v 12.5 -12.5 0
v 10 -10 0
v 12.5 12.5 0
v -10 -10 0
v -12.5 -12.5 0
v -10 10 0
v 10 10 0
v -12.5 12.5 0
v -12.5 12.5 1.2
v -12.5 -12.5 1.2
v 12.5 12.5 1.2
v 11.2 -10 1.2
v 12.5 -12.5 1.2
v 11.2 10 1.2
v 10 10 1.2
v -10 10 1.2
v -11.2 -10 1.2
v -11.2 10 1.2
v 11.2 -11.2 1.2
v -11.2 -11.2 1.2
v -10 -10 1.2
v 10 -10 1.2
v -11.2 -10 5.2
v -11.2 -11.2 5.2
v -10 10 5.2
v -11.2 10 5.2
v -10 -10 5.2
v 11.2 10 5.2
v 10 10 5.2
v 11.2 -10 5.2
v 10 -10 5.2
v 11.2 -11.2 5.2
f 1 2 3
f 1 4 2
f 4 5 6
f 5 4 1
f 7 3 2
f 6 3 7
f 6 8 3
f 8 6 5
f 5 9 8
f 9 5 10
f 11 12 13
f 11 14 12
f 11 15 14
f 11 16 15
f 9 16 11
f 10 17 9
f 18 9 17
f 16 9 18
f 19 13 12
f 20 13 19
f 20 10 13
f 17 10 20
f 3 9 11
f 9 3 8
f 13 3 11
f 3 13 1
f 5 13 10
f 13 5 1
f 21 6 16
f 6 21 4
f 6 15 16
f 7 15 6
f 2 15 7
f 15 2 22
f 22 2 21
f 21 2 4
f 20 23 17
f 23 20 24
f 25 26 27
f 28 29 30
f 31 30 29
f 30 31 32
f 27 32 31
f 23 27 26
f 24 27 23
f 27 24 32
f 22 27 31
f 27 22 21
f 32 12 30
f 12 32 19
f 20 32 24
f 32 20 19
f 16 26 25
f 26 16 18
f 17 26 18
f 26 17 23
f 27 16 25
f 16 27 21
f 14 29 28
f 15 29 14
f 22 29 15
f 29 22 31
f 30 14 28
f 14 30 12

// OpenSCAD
// ============================================================
// Peltier 쪽 면 - 평면도(XY, 정면에서 본 모습)
// 아래쪽 변("erm_link" 부분)이 ERM 면과 연결됨.
// ============================================================

face_size  = 25;   // 면의 가로/세로 (정사각형)
housing_t  = 1.2;  // 하우징 두께 (사방 테두리)
border_gap = 0.1;  // 테두리 안쪽 빈 공간 (X방향: 좌우 브라켓/연결부 폭 계산용)
top_gap    = 1.3;  // 위쪽 테두리 - 브라켓 사이 Y방향 빈 공간 (bracket_h 1.2mm 축소분 보충: 0.1 -> 1.3)

bracket_w  = 1.2;   // 세로 브라켓(Peltier 고정) 가로 두께
bracket_h  = 20;    // 세로 브라켓(Peltier 고정) 세로 높이
open_w     = 20;    // 브라켓 사이 뚫린 공간 가로 폭
erm_link_h = 1.2;   // ERM 면과 연결되는 부분의 세로 두께 (브라켓과 바로 붙음)
mid_gap    = 0.1;   // ERM 연결부 - 바깥 하우징 테두리 사이 빈 공간

bracket_z  = 4;     // Peltier 고정 두께의 Z방향 깊이
guide_h    = 0.01;  // 참고용 2D 레이아웃 표시용 얇은 두께

// --- 경계 계산 (중심 원점) ---
frame_inner_w = face_size - 2 * housing_t;              // 테두리 프레임 안쪽 폭 (22.6mm)
inner_w       = face_size - 2 * (housing_t + border_gap); // 테두리+갭 안쪽 폭 (22.4mm)

// Y축 (위 -> 아래)
y_top       = face_size / 2;
y1 = y_top - housing_t;      // top_gap 상단
y2 = y1 - top_gap;           // 브라켓 상단
y3 = y2 - bracket_h;         // ERM 연결부 상단 (브라켓과 바로 붙음)
y4 = y3 - erm_link_h;        // mid_gap 상단
y5 = y4 - mid_gap;           // 하우징 아래쪽 테두리 상단
y_bottom = y5 - housing_t;   // 검증용 (-face_size/2 와 같아야 함)

// X축 (왼쪽 -> 오른쪽)
x_left        = -face_size / 2;
x1 = x_left + housing_t;         // border_gap 오른쪽 끝
x2 = x1 + border_gap;            // 왼쪽 브라켓 오른쪽 끝
x3 = x2 + bracket_w;             // 뚫린 공간(open_w) 오른쪽 끝
x4 = x3 + open_w;                // 오른쪽 브라켓 왼쪽 끝
x5 = x4 + bracket_w;             // border_gap 오른쪽 끝
x_right_check = x5 + border_gap + housing_t; // 검증용 (face_size/2 와 같아야 함)

bracket_center_y = (y2 + y3) / 2;
left_bracket_center_x  = (x2 + x3) / 2;
right_bracket_center_x = (x4 + x5) / 2;

echo("y_bottom check =", y_bottom, " (should be", -face_size / 2, ")");
echo("x_right check =", x_right_check, " (should be", face_size / 2, ")");
echo("bracket centers: left =", left_bracket_center_x, " right =", right_bracket_center_x, " y =", bracket_center_y);

// --- 참고용 2D 레이아웃 (Z 깊이 미정 영역, 반투명 표시) ---
// 브라켓 자리(20mm x 20mm)를 관통 구멍으로 뚫음
module face_reference_2d() {
    color("gray")
        difference() {
            linear_extrude(height = housing_t)
                square([face_size, face_size], center = true);
            translate([0, bracket_center_y, -0.1])
                linear_extrude(height = housing_t + 0.2)
                    square([open_w, bracket_h], center = true);
        }
}

// --- ERM 연결부 (실제 3D, 바닥판 위에 Z 깊이 4mm 추가) ---
module erm_link() {
    color("green")
        translate([0, 0, housing_t])
            linear_extrude(height = bracket_z)
                translate([0, y3 - erm_link_h / 2])
                    square([inner_w, erm_link_h], center = true);
}

// --- Peltier 고정 브라켓 (실제 3D, 바닥판 위에 Z 깊이 4mm 추가) ---
module peltier_brackets() {
    color("SteelBlue")
        translate([0, 0, housing_t])
            linear_extrude(height = bracket_z) {
                translate([left_bracket_center_x, bracket_center_y])
                    square([bracket_w, bracket_h], center = true);
                translate([right_bracket_center_x, bracket_center_y])
                    square([bracket_w, bracket_h], center = true);
            }
}

face_reference_2d();
erm_link();
peltier_brackets();
